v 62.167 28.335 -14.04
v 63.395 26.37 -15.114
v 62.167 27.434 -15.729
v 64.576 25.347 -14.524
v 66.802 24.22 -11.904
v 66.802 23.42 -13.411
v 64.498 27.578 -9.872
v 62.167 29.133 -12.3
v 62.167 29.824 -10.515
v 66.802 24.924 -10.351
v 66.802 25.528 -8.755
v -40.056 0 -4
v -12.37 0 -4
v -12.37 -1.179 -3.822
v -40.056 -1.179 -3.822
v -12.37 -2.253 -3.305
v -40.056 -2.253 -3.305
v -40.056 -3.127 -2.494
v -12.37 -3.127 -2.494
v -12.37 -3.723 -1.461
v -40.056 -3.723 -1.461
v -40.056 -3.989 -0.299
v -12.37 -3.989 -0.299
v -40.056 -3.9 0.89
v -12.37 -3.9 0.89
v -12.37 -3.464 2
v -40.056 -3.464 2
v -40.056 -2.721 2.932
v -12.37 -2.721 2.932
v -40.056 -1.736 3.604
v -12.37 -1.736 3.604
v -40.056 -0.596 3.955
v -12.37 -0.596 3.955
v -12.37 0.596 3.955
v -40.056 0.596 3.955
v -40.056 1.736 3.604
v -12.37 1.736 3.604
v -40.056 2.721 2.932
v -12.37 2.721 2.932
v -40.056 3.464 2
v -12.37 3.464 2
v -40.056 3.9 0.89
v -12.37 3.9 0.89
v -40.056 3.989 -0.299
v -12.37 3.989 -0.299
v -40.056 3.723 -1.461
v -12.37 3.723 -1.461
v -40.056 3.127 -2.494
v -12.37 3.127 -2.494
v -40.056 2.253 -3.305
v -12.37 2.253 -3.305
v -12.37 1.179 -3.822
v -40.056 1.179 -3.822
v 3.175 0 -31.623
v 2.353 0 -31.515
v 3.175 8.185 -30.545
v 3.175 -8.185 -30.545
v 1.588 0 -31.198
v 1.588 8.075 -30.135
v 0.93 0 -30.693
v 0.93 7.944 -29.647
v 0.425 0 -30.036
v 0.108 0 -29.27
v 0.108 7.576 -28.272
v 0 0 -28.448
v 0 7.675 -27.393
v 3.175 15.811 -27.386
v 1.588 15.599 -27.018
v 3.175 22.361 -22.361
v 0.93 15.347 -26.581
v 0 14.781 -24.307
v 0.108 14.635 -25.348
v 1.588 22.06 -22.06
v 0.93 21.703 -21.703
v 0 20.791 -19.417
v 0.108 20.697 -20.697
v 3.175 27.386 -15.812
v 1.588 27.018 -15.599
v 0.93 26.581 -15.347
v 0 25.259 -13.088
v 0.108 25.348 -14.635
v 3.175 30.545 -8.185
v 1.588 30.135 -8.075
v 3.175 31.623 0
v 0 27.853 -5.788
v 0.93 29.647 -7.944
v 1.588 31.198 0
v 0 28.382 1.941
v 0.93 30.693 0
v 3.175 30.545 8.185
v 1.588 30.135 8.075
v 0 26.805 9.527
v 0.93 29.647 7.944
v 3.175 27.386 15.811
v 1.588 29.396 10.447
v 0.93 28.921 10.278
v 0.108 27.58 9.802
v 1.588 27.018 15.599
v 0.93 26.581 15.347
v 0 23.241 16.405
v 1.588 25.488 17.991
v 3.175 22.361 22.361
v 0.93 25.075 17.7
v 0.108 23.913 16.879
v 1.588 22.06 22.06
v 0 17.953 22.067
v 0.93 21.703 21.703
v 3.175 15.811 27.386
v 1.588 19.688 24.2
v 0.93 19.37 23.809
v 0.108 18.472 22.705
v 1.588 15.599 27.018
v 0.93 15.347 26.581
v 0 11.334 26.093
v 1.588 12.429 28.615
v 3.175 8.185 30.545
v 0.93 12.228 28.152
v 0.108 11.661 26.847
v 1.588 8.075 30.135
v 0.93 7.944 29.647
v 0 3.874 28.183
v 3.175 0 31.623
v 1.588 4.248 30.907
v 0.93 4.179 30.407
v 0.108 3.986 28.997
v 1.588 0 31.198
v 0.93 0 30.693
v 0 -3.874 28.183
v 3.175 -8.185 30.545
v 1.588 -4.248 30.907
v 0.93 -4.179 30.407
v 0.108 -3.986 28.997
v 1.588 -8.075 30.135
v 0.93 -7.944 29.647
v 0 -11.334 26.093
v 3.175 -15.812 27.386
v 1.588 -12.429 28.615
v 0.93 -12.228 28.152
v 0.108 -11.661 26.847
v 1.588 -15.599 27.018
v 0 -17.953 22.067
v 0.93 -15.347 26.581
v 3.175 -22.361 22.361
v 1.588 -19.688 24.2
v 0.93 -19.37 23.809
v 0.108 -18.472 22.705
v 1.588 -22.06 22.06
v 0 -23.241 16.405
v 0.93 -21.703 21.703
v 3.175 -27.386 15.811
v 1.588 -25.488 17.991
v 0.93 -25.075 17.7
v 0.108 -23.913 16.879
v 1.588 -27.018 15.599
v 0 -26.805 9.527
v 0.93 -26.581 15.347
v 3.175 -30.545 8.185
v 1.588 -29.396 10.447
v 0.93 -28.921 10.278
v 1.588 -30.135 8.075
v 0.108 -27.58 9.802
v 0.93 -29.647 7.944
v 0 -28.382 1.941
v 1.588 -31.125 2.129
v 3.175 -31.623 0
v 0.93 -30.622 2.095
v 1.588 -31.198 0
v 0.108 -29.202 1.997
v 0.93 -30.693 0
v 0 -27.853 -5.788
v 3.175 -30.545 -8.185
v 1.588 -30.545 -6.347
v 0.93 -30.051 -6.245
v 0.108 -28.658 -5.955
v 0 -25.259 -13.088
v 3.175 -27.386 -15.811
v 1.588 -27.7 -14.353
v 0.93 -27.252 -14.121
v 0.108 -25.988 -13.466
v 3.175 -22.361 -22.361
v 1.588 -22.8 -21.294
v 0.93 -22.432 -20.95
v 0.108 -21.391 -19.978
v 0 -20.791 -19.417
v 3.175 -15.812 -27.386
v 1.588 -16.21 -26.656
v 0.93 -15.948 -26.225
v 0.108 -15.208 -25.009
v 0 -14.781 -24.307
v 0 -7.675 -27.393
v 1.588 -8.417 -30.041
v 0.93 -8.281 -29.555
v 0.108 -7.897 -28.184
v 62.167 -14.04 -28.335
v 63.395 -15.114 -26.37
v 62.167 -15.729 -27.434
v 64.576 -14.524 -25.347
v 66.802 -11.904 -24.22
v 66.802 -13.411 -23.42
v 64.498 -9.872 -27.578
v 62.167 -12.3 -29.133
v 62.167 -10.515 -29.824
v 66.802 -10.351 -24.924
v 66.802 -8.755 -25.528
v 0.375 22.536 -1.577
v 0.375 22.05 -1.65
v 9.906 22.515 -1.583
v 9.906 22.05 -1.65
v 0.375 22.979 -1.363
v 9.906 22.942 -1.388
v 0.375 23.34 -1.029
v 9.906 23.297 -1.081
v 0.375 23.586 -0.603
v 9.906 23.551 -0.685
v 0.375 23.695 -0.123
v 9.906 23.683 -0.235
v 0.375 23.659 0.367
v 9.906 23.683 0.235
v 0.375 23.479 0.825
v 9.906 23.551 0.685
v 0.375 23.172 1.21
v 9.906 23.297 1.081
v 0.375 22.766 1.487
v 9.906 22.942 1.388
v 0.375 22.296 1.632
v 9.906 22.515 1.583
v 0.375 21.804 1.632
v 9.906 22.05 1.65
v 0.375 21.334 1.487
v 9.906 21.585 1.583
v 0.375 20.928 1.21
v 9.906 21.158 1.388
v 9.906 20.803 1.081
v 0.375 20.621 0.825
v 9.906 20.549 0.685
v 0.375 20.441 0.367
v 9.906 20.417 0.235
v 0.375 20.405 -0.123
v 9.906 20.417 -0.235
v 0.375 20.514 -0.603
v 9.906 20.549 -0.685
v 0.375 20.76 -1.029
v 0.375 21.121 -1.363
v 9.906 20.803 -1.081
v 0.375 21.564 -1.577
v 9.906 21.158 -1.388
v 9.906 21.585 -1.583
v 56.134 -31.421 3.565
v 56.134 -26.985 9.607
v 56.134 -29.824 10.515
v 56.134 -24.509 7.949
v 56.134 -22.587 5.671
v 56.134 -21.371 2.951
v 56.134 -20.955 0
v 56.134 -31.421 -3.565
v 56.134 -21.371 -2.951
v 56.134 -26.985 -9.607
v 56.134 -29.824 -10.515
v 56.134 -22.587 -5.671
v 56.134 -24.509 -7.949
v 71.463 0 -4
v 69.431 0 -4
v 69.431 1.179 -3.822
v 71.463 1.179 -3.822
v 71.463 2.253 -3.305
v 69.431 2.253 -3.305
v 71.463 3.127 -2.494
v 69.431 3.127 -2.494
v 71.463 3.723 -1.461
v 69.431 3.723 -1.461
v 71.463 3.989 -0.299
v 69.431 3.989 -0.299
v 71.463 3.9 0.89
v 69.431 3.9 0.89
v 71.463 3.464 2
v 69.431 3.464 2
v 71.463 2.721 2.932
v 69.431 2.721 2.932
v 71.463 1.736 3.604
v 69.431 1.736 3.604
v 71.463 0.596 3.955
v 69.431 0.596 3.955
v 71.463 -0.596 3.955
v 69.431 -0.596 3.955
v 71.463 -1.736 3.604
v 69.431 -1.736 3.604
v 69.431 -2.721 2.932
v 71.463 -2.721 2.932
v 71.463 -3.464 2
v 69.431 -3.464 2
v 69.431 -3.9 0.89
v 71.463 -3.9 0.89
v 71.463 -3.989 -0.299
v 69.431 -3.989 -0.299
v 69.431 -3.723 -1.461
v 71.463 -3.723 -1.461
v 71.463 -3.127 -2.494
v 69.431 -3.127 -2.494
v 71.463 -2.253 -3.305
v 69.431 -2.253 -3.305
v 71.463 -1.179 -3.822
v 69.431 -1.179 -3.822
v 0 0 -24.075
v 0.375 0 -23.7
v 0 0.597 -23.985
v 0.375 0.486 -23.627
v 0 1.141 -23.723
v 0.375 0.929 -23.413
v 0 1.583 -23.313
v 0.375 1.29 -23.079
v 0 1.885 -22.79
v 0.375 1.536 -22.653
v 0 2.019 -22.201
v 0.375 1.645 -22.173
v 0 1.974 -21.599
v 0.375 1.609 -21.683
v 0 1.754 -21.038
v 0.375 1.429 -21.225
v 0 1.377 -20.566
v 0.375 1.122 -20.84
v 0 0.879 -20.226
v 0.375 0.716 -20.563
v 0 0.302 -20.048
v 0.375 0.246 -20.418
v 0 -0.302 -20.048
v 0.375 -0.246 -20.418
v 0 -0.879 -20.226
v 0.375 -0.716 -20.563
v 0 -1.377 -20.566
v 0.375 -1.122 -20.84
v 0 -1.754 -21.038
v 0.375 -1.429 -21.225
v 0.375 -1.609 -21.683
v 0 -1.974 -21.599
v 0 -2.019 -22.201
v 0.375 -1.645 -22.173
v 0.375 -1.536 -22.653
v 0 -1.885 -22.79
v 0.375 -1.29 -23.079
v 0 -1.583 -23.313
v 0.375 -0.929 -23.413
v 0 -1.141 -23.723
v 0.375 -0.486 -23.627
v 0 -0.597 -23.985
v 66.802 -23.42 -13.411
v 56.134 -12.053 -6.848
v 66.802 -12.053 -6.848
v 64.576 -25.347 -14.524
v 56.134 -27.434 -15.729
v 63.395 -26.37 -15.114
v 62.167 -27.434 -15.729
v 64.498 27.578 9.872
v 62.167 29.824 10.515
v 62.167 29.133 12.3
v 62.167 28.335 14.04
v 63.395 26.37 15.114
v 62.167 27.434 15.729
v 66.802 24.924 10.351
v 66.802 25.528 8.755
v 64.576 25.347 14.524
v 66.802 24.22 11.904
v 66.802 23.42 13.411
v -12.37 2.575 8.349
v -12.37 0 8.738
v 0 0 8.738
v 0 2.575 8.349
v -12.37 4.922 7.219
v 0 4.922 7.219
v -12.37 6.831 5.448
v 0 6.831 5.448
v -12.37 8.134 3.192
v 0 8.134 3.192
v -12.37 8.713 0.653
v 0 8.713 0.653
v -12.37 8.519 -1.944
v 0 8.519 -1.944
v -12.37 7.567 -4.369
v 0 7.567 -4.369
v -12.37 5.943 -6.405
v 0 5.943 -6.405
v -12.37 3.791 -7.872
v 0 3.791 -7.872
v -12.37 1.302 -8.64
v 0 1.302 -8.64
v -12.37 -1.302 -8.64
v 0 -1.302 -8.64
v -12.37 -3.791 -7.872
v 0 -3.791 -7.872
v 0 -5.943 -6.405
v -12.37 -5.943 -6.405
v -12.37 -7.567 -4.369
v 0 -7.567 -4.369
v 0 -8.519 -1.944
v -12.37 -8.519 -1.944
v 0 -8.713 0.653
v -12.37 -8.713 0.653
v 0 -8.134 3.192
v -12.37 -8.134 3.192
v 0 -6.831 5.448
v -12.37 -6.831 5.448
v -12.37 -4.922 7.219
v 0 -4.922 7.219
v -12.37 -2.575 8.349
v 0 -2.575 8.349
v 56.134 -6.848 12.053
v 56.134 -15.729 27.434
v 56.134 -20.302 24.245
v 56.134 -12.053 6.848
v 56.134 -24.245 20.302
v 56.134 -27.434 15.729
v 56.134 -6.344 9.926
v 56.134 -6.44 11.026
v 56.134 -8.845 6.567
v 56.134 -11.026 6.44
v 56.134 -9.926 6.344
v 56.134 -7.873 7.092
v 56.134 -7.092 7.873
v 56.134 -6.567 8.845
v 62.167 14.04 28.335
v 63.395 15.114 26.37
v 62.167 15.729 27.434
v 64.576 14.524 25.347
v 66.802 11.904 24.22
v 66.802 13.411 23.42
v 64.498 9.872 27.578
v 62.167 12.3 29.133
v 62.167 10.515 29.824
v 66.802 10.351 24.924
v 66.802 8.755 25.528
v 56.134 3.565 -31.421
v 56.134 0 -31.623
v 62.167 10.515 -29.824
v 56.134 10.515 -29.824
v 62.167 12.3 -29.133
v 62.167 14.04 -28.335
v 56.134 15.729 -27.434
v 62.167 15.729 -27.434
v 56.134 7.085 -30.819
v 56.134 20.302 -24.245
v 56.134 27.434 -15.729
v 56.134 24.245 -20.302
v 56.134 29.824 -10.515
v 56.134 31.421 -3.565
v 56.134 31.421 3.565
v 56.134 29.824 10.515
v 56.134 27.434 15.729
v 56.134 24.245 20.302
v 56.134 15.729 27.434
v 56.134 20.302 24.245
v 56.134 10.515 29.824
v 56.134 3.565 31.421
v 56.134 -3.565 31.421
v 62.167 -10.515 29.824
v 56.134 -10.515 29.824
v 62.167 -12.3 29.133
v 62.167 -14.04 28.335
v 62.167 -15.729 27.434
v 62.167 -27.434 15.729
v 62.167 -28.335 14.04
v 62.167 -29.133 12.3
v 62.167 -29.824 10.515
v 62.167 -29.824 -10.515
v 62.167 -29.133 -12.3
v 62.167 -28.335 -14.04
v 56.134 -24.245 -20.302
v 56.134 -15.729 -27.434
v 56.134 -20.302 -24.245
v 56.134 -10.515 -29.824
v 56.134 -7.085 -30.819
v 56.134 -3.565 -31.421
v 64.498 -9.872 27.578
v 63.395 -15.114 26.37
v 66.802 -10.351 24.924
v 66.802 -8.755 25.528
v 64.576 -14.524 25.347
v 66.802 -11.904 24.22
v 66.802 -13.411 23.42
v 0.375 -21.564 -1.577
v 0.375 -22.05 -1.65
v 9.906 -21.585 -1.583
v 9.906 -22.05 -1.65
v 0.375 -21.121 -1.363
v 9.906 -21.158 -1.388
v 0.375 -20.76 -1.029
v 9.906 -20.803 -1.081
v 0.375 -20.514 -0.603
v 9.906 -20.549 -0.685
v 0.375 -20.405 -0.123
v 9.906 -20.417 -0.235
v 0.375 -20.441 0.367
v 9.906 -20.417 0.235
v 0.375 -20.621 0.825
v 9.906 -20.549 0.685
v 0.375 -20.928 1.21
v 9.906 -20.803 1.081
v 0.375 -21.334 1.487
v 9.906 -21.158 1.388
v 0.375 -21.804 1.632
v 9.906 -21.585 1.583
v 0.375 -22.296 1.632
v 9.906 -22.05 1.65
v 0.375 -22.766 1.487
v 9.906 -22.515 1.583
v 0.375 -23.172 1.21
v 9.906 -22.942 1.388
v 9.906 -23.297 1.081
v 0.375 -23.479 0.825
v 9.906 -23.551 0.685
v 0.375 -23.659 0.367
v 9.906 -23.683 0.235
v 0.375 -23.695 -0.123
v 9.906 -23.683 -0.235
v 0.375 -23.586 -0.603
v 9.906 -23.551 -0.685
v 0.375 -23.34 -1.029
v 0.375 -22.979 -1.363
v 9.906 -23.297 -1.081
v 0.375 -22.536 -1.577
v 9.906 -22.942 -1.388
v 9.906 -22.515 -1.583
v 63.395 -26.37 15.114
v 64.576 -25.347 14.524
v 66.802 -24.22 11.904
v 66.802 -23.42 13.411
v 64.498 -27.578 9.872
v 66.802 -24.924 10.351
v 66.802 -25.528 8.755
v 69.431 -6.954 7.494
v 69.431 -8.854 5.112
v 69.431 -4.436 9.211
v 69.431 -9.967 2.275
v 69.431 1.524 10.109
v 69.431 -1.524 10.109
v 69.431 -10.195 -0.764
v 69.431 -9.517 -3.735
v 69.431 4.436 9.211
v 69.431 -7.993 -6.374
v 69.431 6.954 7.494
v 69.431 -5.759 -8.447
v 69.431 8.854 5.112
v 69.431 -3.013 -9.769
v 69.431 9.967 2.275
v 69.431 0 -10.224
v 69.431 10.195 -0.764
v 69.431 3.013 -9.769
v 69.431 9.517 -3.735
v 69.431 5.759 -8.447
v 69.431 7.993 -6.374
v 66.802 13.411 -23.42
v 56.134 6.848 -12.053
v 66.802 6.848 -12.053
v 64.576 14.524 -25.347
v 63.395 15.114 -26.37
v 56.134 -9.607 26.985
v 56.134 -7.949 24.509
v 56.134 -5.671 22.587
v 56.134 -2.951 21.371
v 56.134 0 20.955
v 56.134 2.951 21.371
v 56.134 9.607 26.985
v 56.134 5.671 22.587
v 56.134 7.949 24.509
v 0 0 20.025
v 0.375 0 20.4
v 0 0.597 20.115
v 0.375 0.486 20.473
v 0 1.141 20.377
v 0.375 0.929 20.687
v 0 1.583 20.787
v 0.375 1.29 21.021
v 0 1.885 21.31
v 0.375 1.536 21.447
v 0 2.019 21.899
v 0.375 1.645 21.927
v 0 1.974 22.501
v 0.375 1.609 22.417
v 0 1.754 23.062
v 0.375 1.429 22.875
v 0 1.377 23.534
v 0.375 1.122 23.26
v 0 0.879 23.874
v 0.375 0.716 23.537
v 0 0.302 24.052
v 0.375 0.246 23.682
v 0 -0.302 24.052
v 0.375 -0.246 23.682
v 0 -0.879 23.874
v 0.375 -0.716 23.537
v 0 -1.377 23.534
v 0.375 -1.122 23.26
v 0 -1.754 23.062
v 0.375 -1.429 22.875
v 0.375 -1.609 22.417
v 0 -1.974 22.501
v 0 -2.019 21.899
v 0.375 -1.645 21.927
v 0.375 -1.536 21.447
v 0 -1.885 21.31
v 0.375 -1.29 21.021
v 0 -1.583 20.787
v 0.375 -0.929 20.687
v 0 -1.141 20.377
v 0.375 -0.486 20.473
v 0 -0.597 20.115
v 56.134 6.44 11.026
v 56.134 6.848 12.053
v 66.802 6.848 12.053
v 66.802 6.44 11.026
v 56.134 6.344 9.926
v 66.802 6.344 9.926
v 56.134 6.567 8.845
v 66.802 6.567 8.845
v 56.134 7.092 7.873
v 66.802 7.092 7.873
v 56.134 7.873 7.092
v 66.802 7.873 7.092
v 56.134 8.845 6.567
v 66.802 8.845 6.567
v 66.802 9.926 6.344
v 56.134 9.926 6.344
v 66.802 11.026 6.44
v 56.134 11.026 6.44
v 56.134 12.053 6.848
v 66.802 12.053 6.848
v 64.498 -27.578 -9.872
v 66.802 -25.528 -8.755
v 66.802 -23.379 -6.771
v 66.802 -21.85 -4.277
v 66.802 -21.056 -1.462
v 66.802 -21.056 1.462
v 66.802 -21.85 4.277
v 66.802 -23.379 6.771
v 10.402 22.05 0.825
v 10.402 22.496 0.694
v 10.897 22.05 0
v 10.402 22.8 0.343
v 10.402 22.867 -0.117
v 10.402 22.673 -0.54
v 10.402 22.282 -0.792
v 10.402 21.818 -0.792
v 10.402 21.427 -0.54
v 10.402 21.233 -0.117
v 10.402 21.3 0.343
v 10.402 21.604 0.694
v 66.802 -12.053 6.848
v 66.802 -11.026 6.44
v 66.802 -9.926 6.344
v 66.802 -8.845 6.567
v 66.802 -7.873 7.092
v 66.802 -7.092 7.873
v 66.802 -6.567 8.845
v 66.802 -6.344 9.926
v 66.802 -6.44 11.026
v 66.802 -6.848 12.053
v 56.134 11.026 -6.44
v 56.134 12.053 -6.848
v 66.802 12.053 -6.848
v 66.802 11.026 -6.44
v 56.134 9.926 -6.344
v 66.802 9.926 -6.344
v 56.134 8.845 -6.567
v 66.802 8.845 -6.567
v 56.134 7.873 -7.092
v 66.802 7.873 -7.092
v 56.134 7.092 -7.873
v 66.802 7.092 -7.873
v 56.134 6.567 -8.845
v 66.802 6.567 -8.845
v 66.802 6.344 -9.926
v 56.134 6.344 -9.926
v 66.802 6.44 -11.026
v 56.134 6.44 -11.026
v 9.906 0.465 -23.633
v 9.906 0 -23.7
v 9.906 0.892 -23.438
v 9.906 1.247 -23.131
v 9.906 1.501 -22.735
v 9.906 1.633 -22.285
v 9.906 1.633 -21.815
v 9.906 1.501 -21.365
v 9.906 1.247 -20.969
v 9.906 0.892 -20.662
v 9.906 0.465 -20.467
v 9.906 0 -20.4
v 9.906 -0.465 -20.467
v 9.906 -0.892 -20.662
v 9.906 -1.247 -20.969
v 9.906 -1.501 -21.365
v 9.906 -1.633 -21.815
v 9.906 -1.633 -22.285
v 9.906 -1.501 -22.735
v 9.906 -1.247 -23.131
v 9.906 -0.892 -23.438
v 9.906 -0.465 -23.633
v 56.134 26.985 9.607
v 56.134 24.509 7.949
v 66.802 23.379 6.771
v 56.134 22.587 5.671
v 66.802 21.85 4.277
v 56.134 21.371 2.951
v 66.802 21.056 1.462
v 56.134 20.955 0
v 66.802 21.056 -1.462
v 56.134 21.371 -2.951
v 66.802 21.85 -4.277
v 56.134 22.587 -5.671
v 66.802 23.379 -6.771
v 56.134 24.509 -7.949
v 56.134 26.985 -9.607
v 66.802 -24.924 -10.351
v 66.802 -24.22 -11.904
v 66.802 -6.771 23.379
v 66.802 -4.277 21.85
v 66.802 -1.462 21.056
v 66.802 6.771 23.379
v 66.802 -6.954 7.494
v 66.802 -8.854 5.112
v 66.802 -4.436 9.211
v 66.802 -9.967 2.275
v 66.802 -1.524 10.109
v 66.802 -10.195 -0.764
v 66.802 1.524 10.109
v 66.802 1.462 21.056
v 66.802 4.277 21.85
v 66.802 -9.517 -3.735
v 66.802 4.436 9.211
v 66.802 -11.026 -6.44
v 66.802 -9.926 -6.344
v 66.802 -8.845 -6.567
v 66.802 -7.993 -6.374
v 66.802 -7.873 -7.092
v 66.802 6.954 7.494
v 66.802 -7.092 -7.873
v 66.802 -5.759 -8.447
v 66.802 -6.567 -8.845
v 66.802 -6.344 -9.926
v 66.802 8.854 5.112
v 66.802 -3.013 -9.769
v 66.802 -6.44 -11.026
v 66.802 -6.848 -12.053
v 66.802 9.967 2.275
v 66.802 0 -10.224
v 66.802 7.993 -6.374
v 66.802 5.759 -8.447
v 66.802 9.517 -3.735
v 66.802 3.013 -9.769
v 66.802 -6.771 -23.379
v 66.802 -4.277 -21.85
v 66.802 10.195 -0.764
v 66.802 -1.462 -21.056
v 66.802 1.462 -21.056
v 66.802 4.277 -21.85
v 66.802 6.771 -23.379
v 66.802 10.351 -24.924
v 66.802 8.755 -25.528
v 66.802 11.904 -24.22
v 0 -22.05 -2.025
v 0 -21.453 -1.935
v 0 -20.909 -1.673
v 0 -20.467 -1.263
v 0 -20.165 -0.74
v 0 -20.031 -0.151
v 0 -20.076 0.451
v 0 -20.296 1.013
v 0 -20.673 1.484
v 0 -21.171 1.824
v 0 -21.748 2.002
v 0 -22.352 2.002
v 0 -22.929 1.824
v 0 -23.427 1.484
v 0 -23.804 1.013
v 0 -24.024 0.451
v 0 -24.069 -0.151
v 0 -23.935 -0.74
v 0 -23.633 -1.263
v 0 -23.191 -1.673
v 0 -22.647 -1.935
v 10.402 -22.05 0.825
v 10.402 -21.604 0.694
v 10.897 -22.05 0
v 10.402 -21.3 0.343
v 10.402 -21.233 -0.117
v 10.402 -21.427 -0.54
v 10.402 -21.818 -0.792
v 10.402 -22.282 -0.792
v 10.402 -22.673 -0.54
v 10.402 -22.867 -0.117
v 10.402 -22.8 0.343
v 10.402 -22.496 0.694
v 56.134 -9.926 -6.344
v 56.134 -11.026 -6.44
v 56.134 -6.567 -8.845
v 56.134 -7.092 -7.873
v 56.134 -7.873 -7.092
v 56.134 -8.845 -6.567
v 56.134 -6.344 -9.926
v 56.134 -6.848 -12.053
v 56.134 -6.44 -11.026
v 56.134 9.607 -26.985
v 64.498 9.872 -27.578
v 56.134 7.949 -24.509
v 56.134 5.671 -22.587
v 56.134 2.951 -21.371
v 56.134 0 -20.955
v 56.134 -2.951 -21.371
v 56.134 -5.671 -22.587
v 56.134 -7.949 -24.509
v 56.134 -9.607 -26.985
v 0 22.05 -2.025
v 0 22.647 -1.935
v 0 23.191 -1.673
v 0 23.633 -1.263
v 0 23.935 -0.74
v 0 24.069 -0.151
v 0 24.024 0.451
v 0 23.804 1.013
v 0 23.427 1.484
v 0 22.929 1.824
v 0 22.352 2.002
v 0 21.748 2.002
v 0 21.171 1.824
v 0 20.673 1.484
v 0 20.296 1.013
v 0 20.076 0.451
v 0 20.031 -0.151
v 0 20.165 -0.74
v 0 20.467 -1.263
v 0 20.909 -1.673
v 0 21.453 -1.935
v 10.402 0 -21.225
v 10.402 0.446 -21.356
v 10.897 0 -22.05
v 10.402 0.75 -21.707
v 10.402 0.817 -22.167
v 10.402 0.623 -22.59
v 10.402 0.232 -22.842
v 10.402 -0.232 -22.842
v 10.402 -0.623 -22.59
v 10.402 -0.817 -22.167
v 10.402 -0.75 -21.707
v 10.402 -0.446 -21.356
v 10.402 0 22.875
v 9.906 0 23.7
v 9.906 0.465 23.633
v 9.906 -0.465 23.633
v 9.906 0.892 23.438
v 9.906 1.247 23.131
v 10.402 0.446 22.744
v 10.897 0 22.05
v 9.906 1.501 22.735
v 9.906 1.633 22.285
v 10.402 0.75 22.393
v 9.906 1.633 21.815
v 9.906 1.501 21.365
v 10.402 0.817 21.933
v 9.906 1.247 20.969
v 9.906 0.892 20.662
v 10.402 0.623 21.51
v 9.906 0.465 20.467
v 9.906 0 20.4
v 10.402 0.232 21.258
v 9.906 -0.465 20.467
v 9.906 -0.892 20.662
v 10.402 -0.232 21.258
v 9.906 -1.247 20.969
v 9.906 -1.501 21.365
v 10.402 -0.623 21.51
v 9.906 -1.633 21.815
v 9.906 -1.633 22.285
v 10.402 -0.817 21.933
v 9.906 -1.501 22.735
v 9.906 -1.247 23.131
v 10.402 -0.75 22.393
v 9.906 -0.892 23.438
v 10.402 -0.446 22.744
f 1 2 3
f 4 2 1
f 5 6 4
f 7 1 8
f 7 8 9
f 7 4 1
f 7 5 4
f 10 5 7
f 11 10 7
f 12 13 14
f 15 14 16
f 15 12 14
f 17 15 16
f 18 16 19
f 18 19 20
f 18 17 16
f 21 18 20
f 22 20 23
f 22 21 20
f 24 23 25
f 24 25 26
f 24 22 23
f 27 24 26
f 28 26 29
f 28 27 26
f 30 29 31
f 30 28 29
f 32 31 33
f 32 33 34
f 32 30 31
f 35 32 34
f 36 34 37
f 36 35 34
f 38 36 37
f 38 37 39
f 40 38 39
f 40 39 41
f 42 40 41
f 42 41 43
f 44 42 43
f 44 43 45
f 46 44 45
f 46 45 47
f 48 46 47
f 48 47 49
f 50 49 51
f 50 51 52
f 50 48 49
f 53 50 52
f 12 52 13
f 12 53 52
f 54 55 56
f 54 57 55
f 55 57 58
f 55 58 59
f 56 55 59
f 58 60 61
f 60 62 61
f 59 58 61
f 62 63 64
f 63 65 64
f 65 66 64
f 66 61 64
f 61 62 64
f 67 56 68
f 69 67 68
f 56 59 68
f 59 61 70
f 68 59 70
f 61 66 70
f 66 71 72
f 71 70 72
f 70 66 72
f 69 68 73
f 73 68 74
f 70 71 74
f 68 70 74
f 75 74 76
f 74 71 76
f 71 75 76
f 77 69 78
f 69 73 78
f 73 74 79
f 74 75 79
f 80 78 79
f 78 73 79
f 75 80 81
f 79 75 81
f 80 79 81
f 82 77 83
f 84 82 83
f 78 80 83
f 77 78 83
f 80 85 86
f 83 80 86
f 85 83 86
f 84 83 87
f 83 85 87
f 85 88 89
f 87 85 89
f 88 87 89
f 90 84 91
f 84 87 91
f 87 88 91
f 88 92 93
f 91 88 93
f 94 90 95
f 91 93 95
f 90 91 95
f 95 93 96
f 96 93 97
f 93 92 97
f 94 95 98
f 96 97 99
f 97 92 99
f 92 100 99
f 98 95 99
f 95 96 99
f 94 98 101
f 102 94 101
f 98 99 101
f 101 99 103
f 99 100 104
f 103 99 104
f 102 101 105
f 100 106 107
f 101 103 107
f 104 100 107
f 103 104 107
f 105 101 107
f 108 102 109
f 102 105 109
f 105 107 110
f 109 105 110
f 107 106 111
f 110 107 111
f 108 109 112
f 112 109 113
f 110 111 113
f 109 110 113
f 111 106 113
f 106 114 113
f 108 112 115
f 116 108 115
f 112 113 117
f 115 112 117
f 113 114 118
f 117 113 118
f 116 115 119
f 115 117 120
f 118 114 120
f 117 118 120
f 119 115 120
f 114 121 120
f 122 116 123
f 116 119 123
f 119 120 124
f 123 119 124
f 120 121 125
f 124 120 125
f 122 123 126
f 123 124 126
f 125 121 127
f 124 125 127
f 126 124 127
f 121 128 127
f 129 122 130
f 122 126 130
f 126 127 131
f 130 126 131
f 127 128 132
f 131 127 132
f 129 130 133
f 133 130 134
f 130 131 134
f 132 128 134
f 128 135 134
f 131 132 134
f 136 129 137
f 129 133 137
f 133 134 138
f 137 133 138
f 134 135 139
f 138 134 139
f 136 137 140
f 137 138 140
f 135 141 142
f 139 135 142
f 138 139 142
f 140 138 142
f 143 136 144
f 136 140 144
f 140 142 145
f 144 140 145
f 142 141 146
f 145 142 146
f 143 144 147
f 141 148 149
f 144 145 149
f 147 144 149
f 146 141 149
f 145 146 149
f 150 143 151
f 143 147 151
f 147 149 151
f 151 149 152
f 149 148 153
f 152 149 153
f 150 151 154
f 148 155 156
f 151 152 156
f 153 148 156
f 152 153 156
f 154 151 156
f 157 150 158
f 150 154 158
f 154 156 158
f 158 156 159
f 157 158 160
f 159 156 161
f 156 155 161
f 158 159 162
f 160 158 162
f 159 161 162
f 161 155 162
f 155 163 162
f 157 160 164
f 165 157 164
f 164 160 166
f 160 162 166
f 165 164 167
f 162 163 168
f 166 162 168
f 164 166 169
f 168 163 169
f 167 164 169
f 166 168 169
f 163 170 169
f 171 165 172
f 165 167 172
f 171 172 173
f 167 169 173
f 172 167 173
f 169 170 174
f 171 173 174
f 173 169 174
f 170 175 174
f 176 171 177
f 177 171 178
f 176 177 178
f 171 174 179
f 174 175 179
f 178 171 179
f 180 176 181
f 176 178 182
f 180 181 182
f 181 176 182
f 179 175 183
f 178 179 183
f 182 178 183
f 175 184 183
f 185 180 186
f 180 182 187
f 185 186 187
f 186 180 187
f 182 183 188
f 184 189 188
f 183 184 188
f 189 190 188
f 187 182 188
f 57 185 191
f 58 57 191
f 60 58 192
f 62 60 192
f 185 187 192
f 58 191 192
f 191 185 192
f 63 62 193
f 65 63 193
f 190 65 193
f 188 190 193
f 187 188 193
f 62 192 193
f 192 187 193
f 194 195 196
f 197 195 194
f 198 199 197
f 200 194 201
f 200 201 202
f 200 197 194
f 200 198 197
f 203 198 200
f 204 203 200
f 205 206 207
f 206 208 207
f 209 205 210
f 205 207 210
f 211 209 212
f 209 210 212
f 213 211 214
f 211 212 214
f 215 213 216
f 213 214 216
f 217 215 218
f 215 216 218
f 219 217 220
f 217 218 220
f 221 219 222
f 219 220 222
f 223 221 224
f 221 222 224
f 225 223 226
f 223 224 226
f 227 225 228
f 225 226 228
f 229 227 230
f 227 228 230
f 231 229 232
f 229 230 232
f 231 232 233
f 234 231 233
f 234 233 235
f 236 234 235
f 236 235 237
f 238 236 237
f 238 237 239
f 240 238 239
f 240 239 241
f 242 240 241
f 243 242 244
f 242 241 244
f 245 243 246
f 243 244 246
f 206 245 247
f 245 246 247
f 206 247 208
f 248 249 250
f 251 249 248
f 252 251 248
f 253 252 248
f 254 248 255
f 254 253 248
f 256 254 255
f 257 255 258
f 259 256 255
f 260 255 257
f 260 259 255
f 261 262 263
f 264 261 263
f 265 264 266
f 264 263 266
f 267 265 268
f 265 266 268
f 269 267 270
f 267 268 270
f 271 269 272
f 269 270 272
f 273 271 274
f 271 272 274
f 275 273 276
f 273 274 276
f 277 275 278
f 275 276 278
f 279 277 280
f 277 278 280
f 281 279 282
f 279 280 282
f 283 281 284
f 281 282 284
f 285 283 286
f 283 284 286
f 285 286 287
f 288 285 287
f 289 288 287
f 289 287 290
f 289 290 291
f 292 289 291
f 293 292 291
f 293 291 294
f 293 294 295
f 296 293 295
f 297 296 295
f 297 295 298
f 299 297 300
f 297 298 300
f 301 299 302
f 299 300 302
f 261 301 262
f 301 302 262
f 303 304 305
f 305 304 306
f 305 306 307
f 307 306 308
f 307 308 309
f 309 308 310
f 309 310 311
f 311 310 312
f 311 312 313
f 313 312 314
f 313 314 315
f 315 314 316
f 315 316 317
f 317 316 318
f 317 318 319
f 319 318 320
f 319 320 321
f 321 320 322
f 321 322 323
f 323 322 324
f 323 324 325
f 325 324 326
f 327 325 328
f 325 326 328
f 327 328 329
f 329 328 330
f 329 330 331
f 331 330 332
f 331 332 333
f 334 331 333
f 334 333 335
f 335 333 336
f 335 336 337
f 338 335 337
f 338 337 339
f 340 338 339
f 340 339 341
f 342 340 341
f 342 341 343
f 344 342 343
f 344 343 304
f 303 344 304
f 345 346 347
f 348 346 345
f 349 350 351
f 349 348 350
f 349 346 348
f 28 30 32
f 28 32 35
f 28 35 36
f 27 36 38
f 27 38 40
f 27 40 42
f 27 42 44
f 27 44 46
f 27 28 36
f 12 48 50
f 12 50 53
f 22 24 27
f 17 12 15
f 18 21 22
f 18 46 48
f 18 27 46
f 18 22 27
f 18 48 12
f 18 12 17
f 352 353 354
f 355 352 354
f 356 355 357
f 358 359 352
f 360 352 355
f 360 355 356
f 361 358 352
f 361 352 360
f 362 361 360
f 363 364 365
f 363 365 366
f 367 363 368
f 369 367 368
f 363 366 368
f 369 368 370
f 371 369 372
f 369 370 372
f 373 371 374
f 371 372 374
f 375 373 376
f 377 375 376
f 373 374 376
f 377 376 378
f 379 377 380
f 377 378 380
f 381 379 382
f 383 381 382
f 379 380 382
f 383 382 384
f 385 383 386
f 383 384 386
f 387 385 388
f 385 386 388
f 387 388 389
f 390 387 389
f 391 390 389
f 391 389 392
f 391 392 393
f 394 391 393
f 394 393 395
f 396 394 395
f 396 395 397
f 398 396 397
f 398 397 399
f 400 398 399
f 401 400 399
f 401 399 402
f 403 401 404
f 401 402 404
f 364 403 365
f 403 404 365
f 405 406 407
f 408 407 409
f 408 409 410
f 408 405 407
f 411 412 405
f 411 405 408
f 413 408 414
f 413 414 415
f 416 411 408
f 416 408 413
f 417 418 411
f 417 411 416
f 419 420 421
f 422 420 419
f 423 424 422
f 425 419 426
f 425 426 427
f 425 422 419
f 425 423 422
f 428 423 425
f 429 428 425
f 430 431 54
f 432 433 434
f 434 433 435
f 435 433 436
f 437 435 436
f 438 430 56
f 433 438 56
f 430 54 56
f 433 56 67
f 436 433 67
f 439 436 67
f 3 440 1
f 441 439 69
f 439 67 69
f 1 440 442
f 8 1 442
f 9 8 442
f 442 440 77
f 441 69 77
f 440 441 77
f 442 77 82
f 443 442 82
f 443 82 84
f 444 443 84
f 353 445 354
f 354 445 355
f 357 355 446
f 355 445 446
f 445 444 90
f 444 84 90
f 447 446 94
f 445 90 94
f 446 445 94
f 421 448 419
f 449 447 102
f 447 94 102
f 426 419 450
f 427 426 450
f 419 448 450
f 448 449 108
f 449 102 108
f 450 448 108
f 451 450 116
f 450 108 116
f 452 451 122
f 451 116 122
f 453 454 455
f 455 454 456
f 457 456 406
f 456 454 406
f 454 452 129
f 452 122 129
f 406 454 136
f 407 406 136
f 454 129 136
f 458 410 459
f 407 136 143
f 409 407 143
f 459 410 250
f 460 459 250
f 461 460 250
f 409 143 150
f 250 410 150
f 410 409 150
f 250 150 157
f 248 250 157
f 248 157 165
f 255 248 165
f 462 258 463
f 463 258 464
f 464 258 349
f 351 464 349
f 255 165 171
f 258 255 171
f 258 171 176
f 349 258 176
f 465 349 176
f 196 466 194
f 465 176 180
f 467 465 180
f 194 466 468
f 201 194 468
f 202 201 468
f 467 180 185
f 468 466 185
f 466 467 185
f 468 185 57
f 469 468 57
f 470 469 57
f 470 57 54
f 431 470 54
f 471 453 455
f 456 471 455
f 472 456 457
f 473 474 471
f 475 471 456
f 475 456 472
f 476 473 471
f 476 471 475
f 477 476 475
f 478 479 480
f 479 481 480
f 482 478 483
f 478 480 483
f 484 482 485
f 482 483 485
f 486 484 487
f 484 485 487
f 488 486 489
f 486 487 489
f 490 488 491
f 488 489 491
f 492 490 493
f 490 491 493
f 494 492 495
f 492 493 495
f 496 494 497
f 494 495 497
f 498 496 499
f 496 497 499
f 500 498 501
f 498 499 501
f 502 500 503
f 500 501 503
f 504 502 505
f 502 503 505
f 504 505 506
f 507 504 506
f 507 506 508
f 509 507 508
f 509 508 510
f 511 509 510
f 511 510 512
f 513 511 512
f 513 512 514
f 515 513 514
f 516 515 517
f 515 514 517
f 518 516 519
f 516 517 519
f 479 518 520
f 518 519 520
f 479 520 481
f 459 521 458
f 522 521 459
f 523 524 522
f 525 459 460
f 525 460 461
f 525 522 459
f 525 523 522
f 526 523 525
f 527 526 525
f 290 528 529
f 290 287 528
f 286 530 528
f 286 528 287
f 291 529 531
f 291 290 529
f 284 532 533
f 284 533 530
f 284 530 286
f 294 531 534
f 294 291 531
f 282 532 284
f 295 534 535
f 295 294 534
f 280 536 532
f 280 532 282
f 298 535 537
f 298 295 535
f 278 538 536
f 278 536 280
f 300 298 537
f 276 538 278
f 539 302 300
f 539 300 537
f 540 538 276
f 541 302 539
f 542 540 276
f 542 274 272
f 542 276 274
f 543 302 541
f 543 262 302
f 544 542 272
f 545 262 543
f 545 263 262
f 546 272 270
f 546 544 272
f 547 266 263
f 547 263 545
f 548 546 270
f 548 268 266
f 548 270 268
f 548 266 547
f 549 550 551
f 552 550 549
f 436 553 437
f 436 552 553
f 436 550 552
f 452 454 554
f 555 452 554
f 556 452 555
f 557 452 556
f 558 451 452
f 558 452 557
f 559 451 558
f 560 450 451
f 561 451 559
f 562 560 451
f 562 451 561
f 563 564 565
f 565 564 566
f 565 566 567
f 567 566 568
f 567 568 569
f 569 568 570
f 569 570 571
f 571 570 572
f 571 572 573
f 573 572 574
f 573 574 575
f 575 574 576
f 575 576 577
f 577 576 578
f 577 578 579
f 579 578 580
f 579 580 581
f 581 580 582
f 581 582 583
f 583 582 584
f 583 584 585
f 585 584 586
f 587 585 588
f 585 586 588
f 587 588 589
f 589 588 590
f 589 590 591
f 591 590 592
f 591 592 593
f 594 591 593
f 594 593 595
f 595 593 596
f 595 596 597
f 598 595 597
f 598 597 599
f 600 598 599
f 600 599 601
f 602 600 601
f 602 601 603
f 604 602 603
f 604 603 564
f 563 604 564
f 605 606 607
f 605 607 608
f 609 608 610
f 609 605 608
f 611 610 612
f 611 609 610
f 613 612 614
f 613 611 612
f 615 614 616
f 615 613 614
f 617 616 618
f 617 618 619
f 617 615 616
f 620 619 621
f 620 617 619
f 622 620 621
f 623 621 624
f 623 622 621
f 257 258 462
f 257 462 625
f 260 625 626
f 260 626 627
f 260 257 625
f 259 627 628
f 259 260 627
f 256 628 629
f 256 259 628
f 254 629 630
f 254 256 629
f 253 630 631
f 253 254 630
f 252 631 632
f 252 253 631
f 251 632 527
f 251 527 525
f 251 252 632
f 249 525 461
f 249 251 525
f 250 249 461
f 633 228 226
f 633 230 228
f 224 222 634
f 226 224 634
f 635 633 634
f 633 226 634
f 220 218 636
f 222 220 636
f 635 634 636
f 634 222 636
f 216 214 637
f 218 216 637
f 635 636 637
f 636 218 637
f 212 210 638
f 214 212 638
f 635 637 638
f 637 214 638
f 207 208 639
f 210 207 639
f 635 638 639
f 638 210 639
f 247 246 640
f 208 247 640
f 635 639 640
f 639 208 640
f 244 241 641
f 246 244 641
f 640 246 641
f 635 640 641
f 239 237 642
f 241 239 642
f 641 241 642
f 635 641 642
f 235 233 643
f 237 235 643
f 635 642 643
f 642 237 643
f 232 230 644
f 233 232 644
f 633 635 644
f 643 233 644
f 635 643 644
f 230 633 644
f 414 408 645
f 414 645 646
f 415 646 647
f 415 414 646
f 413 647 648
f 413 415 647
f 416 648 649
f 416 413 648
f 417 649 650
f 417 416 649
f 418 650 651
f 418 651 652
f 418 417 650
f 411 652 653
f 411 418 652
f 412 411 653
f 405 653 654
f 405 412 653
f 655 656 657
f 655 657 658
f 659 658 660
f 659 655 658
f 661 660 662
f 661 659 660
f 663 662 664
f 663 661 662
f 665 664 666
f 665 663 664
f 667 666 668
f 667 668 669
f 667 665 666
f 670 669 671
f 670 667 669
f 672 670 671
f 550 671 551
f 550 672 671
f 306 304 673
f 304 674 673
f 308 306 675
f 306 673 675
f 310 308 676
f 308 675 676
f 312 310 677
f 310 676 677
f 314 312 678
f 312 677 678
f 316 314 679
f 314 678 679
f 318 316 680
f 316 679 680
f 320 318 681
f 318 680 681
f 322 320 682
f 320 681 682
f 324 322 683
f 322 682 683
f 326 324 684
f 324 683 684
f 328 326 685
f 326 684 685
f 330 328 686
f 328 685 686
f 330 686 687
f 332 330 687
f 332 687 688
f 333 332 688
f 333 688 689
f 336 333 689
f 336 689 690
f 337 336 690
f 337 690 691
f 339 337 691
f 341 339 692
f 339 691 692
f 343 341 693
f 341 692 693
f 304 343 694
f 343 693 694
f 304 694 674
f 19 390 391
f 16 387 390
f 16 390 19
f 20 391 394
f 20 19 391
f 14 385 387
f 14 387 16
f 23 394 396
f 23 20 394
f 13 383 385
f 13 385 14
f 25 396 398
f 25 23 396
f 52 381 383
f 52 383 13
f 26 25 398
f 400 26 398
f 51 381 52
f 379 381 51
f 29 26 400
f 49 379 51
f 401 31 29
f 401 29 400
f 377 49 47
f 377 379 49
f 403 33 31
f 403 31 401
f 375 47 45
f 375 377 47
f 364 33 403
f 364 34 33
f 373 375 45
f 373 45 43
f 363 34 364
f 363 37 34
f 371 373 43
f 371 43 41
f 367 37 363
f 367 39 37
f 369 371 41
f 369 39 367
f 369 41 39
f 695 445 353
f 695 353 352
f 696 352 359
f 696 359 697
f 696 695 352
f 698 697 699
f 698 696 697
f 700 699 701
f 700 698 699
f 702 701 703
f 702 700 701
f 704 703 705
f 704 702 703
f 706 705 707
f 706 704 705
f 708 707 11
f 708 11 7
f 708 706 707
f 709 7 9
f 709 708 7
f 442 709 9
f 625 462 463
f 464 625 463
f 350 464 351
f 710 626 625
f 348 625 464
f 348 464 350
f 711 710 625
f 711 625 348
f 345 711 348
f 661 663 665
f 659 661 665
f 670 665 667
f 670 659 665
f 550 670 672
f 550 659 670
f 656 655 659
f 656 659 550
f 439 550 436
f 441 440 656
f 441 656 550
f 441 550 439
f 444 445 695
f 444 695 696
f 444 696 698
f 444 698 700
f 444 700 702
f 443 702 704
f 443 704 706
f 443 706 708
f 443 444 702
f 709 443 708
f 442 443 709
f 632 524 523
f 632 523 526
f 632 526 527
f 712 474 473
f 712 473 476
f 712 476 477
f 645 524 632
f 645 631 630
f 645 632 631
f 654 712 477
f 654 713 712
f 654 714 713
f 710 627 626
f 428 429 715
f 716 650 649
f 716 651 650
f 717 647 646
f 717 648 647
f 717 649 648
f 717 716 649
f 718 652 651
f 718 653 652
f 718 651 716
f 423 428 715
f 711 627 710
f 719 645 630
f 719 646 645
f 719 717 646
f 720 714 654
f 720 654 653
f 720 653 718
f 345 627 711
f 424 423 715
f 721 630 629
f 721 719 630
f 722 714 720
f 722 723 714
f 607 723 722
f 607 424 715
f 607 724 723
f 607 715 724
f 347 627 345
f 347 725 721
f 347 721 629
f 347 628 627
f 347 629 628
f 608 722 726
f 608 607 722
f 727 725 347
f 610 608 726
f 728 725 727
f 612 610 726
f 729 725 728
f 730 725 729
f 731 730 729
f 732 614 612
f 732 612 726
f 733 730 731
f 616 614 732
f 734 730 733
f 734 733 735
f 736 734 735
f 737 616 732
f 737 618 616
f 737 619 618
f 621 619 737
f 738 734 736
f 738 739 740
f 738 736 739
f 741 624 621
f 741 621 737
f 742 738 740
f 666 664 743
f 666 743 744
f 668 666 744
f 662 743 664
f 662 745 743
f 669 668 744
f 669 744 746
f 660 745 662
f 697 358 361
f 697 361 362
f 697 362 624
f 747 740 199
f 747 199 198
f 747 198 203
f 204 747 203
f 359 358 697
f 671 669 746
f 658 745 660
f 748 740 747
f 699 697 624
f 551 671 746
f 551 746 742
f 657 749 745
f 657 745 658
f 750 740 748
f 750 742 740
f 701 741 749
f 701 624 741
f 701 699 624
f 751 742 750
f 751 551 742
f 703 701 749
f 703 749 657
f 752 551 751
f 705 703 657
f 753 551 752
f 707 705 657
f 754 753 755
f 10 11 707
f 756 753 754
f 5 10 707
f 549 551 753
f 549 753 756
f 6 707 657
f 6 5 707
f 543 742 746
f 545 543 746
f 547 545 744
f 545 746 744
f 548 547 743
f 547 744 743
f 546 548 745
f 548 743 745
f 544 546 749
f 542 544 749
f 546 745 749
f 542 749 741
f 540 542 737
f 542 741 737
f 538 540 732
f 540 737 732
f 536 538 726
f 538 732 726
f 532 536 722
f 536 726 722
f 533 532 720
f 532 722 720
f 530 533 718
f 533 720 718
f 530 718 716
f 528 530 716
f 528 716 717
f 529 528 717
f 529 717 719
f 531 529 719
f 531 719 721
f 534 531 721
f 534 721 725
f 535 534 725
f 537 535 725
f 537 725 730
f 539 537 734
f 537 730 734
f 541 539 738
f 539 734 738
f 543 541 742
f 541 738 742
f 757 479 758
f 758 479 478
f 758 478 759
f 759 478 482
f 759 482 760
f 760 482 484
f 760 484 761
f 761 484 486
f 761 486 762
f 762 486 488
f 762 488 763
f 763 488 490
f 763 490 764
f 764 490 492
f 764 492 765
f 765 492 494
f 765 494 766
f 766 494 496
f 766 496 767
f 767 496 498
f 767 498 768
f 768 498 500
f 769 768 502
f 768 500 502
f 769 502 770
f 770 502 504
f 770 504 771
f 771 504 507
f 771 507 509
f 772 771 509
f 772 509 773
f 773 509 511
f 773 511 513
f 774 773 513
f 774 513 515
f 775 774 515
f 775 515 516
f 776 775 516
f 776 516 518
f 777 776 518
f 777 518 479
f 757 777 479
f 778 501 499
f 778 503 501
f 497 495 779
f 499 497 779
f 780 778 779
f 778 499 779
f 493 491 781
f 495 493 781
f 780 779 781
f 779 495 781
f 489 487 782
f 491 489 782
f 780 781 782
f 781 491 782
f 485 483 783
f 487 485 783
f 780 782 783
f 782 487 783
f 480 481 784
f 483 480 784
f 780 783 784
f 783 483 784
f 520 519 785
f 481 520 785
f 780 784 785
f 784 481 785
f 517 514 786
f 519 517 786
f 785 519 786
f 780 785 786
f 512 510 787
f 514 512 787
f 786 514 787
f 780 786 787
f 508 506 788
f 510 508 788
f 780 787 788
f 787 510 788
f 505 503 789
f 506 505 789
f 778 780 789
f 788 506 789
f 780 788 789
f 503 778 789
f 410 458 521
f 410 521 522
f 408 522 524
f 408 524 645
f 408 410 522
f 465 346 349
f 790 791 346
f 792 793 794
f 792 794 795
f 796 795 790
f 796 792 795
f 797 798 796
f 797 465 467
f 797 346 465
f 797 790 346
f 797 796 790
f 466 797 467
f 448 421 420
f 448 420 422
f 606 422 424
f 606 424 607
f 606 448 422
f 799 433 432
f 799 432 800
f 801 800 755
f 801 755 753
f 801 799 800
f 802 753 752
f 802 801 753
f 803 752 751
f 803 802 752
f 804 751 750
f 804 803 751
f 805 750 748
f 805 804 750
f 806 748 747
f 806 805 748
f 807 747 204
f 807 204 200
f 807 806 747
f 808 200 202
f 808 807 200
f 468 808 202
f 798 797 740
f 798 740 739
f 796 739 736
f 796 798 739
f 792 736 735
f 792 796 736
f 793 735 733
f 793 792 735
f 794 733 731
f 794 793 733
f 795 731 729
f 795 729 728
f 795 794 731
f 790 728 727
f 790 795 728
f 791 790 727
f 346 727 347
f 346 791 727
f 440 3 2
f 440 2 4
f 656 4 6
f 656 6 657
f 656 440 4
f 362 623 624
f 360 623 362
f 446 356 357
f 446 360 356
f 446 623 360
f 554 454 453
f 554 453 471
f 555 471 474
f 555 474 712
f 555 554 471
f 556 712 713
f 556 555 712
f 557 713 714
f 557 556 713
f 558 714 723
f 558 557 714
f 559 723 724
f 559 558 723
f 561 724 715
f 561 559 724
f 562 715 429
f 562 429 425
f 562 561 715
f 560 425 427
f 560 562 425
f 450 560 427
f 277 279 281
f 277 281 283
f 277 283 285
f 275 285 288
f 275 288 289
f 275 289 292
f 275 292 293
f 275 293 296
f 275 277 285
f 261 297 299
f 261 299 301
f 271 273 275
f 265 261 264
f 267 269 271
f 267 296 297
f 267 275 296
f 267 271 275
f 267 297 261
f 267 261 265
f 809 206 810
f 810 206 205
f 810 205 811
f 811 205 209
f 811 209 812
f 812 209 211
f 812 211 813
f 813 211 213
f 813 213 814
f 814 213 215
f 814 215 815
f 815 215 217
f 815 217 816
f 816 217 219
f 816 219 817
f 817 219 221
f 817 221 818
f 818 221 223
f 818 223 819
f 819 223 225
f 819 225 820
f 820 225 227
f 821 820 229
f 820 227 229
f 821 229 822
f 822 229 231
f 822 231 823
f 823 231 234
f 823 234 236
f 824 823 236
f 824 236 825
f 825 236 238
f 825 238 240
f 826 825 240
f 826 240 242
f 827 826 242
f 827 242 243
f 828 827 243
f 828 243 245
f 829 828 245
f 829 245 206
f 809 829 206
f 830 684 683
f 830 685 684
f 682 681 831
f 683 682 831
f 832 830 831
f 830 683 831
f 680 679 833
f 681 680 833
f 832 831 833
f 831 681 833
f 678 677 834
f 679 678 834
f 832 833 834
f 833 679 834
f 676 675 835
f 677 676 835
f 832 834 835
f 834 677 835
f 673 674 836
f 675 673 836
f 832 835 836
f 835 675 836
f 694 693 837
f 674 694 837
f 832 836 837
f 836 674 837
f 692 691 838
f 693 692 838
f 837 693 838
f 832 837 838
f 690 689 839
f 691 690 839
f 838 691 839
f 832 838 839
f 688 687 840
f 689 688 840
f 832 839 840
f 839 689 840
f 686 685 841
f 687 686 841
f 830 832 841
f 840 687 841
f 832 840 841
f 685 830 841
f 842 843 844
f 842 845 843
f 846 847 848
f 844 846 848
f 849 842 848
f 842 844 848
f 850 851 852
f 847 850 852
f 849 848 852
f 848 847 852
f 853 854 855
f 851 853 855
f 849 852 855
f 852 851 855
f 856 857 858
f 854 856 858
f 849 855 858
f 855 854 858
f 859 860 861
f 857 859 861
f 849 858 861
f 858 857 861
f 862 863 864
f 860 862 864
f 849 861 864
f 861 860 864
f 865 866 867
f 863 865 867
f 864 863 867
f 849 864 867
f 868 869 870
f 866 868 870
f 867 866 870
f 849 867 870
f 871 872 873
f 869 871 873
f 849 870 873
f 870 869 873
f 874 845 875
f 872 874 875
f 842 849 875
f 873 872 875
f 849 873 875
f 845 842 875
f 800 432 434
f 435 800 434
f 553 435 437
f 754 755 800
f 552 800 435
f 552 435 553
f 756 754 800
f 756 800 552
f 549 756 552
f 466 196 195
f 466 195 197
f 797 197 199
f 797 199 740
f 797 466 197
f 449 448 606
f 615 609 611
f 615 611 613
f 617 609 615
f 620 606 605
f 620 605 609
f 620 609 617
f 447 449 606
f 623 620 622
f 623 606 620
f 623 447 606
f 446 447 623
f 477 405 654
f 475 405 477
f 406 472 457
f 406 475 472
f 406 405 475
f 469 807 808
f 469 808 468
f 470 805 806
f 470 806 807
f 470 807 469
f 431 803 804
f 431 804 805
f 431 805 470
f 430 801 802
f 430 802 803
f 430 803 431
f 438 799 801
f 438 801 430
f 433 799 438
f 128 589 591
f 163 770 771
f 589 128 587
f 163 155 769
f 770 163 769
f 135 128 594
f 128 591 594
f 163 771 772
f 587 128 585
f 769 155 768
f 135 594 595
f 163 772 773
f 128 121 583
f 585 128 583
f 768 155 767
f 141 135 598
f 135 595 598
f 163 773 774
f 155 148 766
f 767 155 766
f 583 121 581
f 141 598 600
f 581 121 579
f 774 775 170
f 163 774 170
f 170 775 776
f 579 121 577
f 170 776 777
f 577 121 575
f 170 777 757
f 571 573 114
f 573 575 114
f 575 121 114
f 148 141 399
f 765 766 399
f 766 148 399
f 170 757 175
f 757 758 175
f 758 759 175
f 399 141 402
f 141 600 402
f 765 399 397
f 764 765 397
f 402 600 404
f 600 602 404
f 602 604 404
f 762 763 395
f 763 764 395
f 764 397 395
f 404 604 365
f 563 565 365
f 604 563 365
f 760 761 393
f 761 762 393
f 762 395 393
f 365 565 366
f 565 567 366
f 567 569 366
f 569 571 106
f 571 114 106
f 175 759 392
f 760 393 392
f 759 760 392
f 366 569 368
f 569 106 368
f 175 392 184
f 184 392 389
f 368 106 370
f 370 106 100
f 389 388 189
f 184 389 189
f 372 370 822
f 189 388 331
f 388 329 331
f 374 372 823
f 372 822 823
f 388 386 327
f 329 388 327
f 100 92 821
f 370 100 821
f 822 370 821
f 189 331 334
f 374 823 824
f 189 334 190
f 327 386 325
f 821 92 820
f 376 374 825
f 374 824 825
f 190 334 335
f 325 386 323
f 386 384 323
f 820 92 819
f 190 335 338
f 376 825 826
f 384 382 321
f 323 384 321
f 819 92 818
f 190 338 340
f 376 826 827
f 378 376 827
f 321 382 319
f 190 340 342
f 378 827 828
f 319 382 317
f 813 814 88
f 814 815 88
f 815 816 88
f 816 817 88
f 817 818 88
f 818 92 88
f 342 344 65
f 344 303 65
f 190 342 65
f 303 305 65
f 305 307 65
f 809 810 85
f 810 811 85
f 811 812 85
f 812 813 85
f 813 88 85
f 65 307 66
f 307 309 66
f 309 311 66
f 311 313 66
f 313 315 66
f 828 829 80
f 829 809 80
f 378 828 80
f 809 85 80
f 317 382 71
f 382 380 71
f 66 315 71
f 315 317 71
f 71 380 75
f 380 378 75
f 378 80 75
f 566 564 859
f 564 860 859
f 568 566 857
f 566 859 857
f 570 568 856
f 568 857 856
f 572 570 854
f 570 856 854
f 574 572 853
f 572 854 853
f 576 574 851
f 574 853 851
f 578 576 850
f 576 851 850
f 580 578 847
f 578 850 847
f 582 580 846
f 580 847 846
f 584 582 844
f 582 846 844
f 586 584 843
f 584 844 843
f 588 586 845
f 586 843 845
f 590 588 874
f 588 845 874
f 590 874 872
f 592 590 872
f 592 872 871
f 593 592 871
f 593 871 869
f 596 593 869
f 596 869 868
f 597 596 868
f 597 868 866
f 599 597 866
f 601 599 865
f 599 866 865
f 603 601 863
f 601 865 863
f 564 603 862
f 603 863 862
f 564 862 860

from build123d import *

# Parameters (mm, degrees)
SKETCH1_R                       = 31.623
BOSS_EXTRUDE1_DEPTH             = 66.802
CUT_EXTRUDE1_START              = -10.668
CUT_EXTRUDE1_DEPTH              = 10.668
CHAMFER1_SIZE                   = 4.6355
SKETCH3_R                       = 10.2235
BOSS_EXTRUDE2_DEPTH             = 2.6289
SKETCH4_R                       = 4
BOSS_EXTRUDE3_DEPTH             = 2.032
SKETCH5_R                       = 8.7376
BOSS_EXTRUDE4_DEPTH             = 12.3698
BOSS_EXTRUDE5_START             = 27.686
SKETCH6_R                       = 4
BOSS_EXTRUDE5_DEPTH             = 27.686
M4X0_7_TAPPED_HOLE1_D           = 3.3
M4X0_7_TAPPED_HOLE1_DEPTH       = 9.906
M4X0_7_TAPPED_HOLE1_CSINK_D     = 4.05
M4X0_7_TAPPED_HOLE1_CSINK_ANGLE = 90
M4X0_7_TAPPED_HOLE1_TIP         = 0.991420021
FILLET1_R                       = 3.175


with BuildPart() as part:
    # Sketch1 → Boss-Extrude1 (new body)
    with BuildSketch(Plane(origin=(0, 0, 0), x_dir=(0, 0, -1), z_dir=(1, 0, 0))):
        Circle(SKETCH1_R)
    extrude(amount=BOSS_EXTRUDE1_DEPTH)

    # Sketch2 → Cut-Extrude1 (cut)
    with BuildSketch(Plane(origin=(66.802, 0, 0), x_dir=(0, 0, -1), z_dir=(1, 0, 0)).offset(CUT_EXTRUDE1_START)):
        with BuildLine():
            Line((-27.43403991, 15.728559476), (-12.052689417, 6.848132628))
            ThreePointArc((-12.052689417, 6.848132628), (-7.45361258, 7.45361258), (-6.848132628, 12.052689417))
            Line((-6.848132628, 12.052689417), (-15.728559476, 27.43403991))
            ThreePointArc((-15.728559476, 27.43403991), (-22.360837741, 22.360837741), (-27.43403991, 15.728559476))
        make_face()
        with BuildLine():
            ThreePointArc((-29.823578313, -10.515146485), (-20.955, 0), (-29.823578313, 10.515146485))
            ThreePointArc((-29.823578313, 10.515146485), (-31.623, 0), (-29.823578313, -10.515146485))
        make_face()
        with BuildLine():
            ThreePointArc((6.848132628, 12.052689417), (7.45361258, 7.45361258), (12.052689417, 6.848132628))
            Line((12.052689417, 6.848132628), (27.43403991, 15.728559476))
            ThreePointArc((27.43403991, 15.728559476), (22.360837741, 22.360837741), (15.728559476, 27.43403991))
            Line((15.728559476, 27.43403991), (6.848132628, 12.052689417))
        make_face()
        with BuildLine():
            ThreePointArc((-6.848132628, -12.052689417), (-7.45361258, -7.45361258), (-12.052689417, -6.848132628))
            Line((-12.052689417, -6.848132628), (-27.43403991, -15.728559476))
            ThreePointArc((-27.43403991, -15.728559476), (-22.360837741, -22.360837741), (-15.728559476, -27.43403991))
            Line((-15.728559476, -27.43403991), (-6.848132628, -12.052689417))
        make_face()
        with BuildLine():
            ThreePointArc((10.515146485, 29.823578313), (0, 31.623), (-10.515146485, 29.823578313))
            ThreePointArc((-10.515146485, 29.823578313), (0, 20.955), (10.515146485, 29.823578313))
        make_face()
        with BuildLine():
            ThreePointArc((12.052689417, -6.848132628), (7.45361258, -7.45361258), (6.848132628, -12.052689417))
            Line((6.848132628, -12.052689417), (15.728559476, -27.43403991))
            ThreePointArc((15.728559476, -27.43403991), (22.360837741, -22.360837741), (27.43403991, -15.728559476))
            Line((27.43403991, -15.728559476), (12.052689417, -6.848132628))
        make_face()
        with BuildLine():
            ThreePointArc((29.823578313, -10.515146485), (31.623, 0), (29.823578313, 10.515146485))
            ThreePointArc((29.823578313, 10.515146485), (20.955, 0), (29.823578313, -10.515146485))
        make_face()
        with BuildLine():
            ThreePointArc((10.515146485, -29.823578313), (0, -20.955), (-10.515146485, -29.823578313))
            ThreePointArc((-10.515146485, -29.823578313), (0, -31.623), (10.515146485, -29.823578313))
        make_face()
    extrude(amount=CUT_EXTRUDE1_DEPTH, mode=Mode.SUBTRACT)

    # Chamfer1
    chamfer1_edges = [part.edges().sort_by_distance(p)[0] for p in [
        (66.802, 13.176133693, -28.747236909),
        (66.802, 28.747236909, -13.176133693),
        (66.802, 28.747236909, 13.176133693),
        (66.802, 13.176133693, 28.747236909),
        (66.802, -13.176133693, 28.747236909),
        (66.802, -28.747236909, 13.176133693),
        (66.802, -28.747236909, -13.176133693),
        (66.802, -13.176133693, -28.747236909),
    ]]
    chamfer(chamfer1_edges, length=CHAMFER1_SIZE)

    # Sketch3 → Boss-Extrude2 (add)
    with BuildSketch(Plane(origin=(66.802, 0, 0), x_dir=(0, 0, -1), z_dir=(1, 0, 0))):
        Circle(SKETCH3_R)
    extrude(amount=BOSS_EXTRUDE2_DEPTH)

    # Sketch4 → Boss-Extrude3 (add)
    with BuildSketch(Plane(origin=(69.4309, 0, 0), x_dir=(0, 0, -1), z_dir=(1, 0, 0))):
        Circle(SKETCH4_R)
    extrude(amount=BOSS_EXTRUDE3_DEPTH)

    # Sketch5 → Boss-Extrude4 (add)
    with BuildSketch(Plane.ZY):
        Circle(SKETCH5_R)
    extrude(amount=BOSS_EXTRUDE4_DEPTH)

    # Sketch6 → Boss-Extrude5 (add)
    with BuildSketch(Plane.ZY.offset(12.3698).offset(BOSS_EXTRUDE5_START)):
        with Locations(Location((0, 0, 0), (0, 0, 180))):
            Circle(SKETCH6_R)
    extrude(amount=-BOSS_EXTRUDE5_DEPTH)

    # M4x0.7 Tapped Hole1
    with Locations(Plane.ZY):
        with Locations((0, 22.05), (-22.05, 0), (0, -22.05), (22.05, 0)):
            CounterSinkHole(M4X0_7_TAPPED_HOLE1_D / 2, M4X0_7_TAPPED_HOLE1_CSINK_D / 2, depth=M4X0_7_TAPPED_HOLE1_DEPTH, counter_sink_angle=M4X0_7_TAPPED_HOLE1_CSINK_ANGLE)
            with Locations((0, 0, -(M4X0_7_TAPPED_HOLE1_DEPTH + M4X0_7_TAPPED_HOLE1_TIP / 2))):  # 118° drill point
                Cone(0, M4X0_7_TAPPED_HOLE1_D / 2, M4X0_7_TAPPED_HOLE1_TIP, mode=Mode.SUBTRACT)

    # Fillet1
    fillet1_edges = [part.edges().sort_by_distance(p)[0] for p in [
        (0, 0, 31.623),
    ]]
    fillet(fillet1_edges, radius=FILLET1_R)


solid = part.part
